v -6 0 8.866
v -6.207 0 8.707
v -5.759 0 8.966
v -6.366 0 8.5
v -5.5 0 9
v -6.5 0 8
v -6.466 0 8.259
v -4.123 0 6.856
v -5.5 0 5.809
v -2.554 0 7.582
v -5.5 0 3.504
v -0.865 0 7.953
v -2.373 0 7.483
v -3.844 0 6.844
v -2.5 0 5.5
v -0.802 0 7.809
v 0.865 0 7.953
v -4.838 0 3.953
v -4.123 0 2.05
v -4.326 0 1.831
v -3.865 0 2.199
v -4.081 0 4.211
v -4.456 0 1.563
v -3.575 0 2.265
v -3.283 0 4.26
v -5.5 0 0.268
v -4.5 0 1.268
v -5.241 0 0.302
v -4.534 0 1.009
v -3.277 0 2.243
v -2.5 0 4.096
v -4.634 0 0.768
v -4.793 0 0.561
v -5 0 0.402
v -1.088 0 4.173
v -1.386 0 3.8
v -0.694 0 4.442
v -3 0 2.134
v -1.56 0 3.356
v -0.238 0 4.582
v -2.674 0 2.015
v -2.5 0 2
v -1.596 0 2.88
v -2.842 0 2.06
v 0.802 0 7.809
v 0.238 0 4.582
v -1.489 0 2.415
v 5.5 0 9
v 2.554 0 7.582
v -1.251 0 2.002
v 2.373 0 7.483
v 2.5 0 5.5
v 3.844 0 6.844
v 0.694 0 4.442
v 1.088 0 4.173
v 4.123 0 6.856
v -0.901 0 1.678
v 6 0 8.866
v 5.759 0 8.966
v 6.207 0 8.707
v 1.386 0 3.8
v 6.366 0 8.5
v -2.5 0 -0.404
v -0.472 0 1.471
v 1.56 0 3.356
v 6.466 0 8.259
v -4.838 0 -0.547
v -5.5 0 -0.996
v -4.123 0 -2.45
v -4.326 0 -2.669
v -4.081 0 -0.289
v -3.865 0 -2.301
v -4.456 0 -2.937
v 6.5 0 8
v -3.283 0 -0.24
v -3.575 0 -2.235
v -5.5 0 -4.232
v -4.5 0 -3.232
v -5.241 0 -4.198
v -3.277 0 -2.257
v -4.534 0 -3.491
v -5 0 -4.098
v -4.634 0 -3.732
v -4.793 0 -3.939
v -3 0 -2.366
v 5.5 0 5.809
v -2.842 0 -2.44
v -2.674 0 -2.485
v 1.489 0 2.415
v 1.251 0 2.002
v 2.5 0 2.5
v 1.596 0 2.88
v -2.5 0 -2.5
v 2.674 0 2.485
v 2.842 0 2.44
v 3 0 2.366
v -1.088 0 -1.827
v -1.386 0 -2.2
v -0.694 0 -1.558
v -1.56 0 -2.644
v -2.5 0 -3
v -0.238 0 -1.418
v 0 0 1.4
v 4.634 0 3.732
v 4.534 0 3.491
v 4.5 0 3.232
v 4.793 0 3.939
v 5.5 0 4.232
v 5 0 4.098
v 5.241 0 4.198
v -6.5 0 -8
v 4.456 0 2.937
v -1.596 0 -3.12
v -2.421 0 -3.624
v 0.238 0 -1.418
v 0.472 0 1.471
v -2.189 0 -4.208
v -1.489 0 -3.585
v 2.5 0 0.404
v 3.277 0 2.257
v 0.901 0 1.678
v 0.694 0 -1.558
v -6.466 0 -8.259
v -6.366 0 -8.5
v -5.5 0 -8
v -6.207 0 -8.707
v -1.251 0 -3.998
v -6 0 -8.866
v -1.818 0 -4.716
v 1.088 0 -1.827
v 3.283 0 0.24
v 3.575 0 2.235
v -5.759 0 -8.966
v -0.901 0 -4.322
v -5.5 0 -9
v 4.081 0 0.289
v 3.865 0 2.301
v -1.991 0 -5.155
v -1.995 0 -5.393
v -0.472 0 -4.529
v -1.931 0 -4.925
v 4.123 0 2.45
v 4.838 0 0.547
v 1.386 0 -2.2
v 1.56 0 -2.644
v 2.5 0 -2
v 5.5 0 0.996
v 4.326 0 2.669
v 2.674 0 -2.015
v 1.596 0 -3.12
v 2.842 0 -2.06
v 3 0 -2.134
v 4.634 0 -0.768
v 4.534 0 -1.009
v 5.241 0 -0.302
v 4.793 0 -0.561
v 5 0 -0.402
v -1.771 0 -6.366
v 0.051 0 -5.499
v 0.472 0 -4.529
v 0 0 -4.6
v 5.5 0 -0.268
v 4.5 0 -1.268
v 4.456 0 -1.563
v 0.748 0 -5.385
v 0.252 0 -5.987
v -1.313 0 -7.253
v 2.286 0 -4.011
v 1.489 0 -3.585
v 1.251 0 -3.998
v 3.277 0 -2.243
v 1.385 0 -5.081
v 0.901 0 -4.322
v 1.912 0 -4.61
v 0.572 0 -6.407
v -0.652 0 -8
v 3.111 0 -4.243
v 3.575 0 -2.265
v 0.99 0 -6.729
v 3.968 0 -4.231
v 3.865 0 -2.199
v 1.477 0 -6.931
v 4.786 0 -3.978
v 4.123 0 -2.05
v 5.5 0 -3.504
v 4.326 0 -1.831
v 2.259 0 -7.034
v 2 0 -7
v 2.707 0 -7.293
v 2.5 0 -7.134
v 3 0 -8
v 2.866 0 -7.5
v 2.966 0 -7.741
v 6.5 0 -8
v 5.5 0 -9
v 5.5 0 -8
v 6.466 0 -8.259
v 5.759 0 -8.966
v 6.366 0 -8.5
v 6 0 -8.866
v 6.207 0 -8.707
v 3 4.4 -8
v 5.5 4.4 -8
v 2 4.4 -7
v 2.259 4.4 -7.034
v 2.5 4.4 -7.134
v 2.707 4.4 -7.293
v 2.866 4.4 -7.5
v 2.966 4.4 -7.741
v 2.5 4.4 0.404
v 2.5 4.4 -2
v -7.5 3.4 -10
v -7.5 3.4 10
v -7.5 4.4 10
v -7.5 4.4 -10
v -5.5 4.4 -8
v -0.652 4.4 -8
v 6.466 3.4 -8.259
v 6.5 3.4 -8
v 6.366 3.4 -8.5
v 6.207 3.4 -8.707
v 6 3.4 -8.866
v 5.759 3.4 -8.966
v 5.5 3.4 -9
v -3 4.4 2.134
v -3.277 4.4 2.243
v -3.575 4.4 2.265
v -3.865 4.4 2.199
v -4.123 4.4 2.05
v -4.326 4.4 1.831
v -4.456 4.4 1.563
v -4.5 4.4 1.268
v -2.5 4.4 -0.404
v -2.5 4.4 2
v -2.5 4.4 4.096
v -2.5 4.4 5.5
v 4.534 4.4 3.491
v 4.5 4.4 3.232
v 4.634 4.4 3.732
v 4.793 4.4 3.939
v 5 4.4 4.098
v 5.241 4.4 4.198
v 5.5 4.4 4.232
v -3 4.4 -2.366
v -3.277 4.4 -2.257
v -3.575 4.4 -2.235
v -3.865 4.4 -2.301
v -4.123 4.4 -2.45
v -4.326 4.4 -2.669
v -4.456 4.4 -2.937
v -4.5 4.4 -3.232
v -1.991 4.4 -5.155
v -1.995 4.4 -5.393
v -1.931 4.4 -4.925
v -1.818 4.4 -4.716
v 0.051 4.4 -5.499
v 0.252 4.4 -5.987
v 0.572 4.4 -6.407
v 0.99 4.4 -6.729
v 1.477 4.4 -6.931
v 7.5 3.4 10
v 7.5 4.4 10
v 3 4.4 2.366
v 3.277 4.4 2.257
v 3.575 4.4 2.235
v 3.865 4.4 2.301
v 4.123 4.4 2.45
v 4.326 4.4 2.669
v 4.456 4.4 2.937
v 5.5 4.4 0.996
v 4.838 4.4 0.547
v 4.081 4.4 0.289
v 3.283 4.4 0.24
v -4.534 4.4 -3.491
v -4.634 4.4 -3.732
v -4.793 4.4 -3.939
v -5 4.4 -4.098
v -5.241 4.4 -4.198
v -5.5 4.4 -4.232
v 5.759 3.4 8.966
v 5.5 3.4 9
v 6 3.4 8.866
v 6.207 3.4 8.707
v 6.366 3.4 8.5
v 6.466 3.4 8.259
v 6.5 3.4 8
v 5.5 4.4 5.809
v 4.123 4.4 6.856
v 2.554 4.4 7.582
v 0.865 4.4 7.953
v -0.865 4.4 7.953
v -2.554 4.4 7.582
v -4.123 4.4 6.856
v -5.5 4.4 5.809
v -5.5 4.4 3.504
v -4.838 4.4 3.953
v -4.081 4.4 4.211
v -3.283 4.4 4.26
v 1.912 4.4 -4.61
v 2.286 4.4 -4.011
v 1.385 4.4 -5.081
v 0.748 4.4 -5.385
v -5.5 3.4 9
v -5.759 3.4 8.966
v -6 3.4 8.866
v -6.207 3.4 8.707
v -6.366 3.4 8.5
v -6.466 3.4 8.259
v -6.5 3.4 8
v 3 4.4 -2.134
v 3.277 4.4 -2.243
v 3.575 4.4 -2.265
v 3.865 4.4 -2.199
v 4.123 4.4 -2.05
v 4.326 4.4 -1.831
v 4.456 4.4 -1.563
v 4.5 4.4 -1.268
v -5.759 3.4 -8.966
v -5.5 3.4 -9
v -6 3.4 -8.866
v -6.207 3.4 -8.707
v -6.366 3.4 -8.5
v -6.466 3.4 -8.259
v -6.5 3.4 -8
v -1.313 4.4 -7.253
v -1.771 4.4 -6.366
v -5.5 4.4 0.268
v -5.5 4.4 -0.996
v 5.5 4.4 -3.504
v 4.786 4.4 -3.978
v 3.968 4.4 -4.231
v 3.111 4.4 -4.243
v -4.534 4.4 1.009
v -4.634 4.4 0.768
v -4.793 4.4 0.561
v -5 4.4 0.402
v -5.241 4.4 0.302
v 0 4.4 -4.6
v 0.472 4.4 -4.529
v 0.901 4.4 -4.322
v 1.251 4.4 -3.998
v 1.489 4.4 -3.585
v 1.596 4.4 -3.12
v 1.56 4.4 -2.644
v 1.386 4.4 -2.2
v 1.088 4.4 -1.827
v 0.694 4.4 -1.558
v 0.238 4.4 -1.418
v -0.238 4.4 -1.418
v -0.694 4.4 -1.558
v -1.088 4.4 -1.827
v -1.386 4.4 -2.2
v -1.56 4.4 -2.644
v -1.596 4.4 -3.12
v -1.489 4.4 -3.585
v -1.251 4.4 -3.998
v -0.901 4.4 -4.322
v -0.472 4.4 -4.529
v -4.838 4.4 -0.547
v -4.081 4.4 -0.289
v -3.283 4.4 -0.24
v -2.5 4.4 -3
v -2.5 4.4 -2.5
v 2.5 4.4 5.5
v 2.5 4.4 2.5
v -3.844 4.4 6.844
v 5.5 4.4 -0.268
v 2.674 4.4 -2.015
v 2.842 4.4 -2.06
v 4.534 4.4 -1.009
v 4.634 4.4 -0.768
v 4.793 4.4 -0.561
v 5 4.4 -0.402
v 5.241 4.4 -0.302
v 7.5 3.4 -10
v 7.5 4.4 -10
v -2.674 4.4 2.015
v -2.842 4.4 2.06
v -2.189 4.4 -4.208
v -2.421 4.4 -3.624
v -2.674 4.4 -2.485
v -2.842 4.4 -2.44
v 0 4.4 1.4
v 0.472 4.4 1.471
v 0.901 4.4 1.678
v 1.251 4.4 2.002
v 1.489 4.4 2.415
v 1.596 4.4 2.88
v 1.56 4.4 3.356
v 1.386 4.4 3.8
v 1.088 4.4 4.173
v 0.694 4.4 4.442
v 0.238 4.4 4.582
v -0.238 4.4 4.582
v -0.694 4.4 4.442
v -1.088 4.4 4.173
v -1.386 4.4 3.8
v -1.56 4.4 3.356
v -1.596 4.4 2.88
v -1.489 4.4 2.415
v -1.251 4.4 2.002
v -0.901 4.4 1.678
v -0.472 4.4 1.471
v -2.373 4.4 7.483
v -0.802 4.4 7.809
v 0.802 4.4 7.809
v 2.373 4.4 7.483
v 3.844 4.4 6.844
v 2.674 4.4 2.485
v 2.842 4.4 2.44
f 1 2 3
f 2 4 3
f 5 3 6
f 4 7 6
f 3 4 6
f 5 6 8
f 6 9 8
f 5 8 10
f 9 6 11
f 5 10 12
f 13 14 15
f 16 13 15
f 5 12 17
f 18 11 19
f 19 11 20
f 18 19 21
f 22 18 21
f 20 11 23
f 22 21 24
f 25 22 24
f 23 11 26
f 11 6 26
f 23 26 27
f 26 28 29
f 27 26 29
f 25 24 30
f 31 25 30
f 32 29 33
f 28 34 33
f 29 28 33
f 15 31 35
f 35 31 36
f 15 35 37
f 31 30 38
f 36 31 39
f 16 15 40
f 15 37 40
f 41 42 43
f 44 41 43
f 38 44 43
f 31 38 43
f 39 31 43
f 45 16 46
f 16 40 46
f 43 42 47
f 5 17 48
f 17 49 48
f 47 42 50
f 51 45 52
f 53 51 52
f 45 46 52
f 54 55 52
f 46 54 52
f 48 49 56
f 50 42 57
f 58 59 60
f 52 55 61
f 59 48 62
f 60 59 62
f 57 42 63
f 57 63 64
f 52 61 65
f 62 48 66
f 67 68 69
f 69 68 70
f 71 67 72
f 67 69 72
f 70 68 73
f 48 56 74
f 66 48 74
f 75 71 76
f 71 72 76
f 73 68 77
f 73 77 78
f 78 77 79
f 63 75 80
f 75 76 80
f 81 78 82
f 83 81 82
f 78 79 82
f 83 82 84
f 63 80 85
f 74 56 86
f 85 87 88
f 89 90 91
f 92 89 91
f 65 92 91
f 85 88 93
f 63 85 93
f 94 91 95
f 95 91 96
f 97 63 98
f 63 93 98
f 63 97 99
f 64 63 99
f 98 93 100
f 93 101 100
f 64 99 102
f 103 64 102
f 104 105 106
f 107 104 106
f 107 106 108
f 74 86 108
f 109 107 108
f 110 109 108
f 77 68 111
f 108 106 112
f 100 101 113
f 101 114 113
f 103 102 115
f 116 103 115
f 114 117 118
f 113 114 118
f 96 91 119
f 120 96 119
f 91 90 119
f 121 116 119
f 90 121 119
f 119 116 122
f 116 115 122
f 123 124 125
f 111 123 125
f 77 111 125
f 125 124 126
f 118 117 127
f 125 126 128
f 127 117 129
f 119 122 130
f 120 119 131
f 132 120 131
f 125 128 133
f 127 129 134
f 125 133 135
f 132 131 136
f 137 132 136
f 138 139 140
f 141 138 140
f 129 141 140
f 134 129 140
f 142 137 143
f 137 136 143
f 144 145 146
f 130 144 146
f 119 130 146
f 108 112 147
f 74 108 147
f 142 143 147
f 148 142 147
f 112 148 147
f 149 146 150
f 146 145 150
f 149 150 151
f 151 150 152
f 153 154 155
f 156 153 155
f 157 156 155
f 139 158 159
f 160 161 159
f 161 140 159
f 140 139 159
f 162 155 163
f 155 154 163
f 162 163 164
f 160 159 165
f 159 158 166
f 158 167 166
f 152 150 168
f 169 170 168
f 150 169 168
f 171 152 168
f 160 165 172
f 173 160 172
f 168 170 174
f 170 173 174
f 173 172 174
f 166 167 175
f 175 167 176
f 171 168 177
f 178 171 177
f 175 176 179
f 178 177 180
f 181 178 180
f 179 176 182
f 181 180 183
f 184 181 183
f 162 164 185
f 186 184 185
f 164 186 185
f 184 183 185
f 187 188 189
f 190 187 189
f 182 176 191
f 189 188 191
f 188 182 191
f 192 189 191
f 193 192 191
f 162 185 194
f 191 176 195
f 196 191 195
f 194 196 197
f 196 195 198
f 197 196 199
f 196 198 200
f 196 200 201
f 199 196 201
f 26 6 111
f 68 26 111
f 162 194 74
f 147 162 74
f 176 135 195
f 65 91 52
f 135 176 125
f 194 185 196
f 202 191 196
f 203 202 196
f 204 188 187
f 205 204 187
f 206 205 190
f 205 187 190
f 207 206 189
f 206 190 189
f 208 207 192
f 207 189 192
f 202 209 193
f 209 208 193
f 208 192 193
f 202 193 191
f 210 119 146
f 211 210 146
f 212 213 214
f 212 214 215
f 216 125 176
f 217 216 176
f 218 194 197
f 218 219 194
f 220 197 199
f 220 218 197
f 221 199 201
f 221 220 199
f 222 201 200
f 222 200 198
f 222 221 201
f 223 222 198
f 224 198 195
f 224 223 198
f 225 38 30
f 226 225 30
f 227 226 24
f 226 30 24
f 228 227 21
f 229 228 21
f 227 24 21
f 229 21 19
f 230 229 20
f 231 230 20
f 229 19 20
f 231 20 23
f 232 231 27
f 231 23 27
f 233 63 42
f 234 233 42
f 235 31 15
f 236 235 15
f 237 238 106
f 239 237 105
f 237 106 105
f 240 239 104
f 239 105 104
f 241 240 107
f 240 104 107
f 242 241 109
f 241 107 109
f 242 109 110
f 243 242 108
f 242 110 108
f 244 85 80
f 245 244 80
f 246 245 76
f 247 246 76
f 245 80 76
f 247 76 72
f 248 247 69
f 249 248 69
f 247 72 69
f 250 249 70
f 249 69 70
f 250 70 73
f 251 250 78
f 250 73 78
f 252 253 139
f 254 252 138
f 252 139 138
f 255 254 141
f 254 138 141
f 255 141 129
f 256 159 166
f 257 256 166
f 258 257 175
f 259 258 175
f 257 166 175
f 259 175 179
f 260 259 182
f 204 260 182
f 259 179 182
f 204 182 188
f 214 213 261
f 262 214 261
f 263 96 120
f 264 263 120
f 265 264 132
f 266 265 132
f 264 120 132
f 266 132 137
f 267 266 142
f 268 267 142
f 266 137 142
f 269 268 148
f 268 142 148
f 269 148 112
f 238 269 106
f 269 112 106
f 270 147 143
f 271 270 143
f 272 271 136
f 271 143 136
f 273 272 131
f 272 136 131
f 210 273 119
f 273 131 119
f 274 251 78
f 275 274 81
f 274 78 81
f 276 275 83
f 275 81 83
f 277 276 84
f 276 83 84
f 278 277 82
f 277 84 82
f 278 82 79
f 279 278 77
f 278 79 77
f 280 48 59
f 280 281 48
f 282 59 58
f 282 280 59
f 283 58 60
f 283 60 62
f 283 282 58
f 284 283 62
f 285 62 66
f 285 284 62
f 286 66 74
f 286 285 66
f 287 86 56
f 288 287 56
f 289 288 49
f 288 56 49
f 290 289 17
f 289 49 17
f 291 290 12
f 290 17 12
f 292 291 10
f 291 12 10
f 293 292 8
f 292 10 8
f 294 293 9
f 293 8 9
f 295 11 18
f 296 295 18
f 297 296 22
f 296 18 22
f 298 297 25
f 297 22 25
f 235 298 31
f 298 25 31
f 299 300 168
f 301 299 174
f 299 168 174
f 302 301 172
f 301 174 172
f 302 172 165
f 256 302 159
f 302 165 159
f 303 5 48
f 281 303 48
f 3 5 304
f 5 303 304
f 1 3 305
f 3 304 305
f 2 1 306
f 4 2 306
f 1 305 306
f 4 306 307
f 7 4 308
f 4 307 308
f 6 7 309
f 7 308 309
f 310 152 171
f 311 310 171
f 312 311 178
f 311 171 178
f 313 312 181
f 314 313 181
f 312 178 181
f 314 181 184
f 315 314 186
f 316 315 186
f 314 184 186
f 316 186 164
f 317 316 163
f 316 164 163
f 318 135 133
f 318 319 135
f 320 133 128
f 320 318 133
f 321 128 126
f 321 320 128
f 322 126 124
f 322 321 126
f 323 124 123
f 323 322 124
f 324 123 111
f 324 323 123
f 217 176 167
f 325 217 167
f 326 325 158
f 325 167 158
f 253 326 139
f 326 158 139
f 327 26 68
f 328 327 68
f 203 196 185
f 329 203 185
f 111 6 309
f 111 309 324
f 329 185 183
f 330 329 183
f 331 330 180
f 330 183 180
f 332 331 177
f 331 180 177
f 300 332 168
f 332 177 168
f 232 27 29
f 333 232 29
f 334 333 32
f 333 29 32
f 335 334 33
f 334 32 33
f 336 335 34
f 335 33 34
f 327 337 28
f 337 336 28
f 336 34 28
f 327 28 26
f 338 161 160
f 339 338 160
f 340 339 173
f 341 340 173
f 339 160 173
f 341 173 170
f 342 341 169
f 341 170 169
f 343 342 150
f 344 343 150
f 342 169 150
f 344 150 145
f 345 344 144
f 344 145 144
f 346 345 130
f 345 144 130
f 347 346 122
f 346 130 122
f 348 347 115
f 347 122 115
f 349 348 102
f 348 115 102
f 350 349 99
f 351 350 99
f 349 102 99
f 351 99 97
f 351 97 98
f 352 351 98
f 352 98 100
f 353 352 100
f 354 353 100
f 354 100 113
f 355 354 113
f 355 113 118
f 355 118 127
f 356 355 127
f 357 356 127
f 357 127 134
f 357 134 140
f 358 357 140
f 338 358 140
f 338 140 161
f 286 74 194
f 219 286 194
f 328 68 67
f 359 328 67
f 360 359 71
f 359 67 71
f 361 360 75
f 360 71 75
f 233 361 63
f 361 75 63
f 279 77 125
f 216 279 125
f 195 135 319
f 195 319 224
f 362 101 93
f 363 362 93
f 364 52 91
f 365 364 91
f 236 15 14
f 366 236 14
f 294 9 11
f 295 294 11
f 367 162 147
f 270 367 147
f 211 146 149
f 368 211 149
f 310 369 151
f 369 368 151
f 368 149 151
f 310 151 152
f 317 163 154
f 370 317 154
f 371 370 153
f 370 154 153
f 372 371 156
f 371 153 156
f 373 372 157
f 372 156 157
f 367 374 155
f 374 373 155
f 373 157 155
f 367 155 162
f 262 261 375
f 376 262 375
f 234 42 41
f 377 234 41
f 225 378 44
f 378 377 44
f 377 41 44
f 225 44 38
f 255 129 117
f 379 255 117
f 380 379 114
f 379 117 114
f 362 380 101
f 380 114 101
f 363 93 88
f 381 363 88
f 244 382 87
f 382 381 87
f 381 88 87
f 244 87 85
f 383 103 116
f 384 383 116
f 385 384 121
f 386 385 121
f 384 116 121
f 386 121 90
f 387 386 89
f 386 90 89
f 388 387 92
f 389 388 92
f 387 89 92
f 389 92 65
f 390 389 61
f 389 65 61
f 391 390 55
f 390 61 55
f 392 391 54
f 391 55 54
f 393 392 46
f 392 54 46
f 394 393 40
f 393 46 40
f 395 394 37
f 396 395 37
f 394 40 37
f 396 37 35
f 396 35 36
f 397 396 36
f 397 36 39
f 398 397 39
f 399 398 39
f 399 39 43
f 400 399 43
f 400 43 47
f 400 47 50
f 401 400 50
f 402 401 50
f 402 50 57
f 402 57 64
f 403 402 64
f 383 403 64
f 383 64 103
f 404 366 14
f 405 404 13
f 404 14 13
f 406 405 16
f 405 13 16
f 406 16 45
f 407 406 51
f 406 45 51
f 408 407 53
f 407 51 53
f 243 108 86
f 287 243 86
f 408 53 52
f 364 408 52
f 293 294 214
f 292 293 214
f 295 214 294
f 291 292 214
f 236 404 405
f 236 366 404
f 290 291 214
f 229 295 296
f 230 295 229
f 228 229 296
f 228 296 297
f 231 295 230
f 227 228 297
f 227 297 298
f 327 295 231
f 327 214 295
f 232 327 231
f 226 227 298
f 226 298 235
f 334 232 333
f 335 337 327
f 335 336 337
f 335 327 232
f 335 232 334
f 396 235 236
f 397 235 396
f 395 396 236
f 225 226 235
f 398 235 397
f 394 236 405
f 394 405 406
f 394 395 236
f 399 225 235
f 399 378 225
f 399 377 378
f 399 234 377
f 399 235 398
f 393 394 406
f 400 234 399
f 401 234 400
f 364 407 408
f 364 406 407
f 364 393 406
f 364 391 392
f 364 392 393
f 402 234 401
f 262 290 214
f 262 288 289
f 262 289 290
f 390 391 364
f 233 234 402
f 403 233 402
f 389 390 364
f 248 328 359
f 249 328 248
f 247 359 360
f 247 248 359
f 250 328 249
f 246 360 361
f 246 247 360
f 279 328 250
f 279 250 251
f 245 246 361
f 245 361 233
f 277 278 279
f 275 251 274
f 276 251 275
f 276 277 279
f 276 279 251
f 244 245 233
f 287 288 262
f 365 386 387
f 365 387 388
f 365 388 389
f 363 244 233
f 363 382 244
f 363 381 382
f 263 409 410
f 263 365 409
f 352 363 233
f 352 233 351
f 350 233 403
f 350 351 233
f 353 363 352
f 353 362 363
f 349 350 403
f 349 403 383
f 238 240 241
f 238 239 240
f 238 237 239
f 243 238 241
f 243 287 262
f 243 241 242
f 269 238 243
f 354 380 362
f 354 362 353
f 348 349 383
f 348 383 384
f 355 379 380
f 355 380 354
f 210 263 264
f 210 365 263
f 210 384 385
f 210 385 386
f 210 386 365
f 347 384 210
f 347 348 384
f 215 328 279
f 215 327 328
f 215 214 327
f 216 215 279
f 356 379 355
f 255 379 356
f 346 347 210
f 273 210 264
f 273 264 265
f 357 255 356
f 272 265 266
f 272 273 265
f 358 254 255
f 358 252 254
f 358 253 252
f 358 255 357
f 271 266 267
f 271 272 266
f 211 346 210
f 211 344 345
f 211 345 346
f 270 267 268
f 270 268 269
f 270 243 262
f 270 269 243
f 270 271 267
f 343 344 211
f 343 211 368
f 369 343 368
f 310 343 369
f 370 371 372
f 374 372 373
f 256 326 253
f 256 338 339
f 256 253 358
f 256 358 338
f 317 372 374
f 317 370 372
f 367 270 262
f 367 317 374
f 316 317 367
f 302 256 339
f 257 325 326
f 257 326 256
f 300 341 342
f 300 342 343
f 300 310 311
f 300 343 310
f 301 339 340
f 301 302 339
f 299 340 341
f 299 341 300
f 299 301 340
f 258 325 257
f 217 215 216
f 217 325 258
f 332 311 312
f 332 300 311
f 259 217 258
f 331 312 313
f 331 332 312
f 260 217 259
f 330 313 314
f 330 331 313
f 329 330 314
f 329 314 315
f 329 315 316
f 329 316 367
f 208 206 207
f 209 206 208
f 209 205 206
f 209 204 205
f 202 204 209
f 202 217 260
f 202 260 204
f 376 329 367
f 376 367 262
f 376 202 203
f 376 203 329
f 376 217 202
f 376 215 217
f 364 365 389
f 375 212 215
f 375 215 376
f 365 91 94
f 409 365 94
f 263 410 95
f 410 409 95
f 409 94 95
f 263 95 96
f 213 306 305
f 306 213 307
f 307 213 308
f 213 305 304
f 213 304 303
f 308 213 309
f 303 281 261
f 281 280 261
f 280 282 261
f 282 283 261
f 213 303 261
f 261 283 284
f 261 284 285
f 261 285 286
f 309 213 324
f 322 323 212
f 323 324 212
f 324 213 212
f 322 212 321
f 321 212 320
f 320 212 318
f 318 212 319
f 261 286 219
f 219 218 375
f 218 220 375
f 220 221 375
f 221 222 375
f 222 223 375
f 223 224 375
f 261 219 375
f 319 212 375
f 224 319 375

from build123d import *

# Parameters (mm, degrees)
SKETCH1_W           = 13
SKETCH1_H           = 18
BOSS_EXTRUDE1_DEPTH = 3.4
SKETCH2_W           = 15
SKETCH2_H           = 20
BOSS_EXTRUDE2_DEPTH = 1
SKETCH4_R           = 1.6
CUT_EXTRUDE2_DEPTH  = 14.251792332
FILLET1_R           = 1


with BuildPart() as part:
    # Sketch1 → Boss-Extrude1 (new body)
    with BuildSketch(Plane(origin=(0, 0, 0), x_dir=(1, 0, 0), z_dir=(0, 1, 0))):
        Rectangle(SKETCH1_W, SKETCH1_H)
    extrude(amount=BOSS_EXTRUDE1_DEPTH)

    # Sketch2 → Boss-Extrude2 (add)
    with BuildSketch(Plane(origin=(0, 3.4, 0), x_dir=(1, 0, 0), z_dir=(0, 1, 0))):
        Rectangle(SKETCH2_W, SKETCH2_H)
    extrude(amount=BOSS_EXTRUDE2_DEPTH)

    # Sketch4 → Cut-Extrude2 (cut, through all)
    with BuildSketch(Plane.XZ):
        with BuildLine():
            Line((-2.5, 5.5), (-3.844272635, 6.844272635))
            ThreePointArc((-3.844272635, 6.844272635), (0, 7.85), (3.844272635, 6.844272635))
            Line((3.844272635, 6.844272635), (2.5, 5.5))
            Line((2.5, 5.5), (2.5, 2.5))
            ThreePointArc((2.5, 2.5), (2.758819045, 2.465925826), (3, 2.366025404))
            ThreePointArc((3, 2.366025404), (4, 2.366025404), (4.5, 3.232050808))
            ThreePointArc((4.5, 3.232050808), (4.792893219, 3.939157589), (5.5, 4.232050808))
            Line((5.5, 4.232050808), (5.5, 5.809475019))
            ThreePointArc((5.5, 5.809475019), (0, 8), (-5.5, 5.809475019))
            Line((-5.5, 5.809475019), (-5.5, 3.50401717))
            ThreePointArc((-5.5, 3.50401717), (-4.08113883, 4.211123951), (-2.5, 4.096376317))
            Line((-2.5, 4.096376317), (-2.5, 5.5))
        make_face()
        with BuildLine():
            Line((-2.5, -0.403623683), (-2.5, 2))
            ThreePointArc((-2.5, 2), (-2.758819045, 2.034074174), (-3, 2.133974596))
            ThreePointArc((-3, 2.133974596), (-4, 2.133974596), (-4.5, 1.267949192))
            ThreePointArc((-4.5, 1.267949192), (-4.792893219, 0.560842411), (-5.5, 0.267949192))
            Line((-5.5, 0.267949192), (-5.5, -0.99598283))
            ThreePointArc((-5.5, -0.99598283), (-4.08113883, -0.288876049), (-2.5, -0.403623683))
        make_face()
        with Locations(Location((0, 3, 0), (0, 0, 270))):
            Circle(SKETCH4_R)
        with BuildLine():
            ThreePointArc((5.5, 0.99598283), (4.08113883, 0.288876049), (2.5, 0.403623683))
            Line((2.5, 0.403623683), (2.5, -2))
            ThreePointArc((2.5, -2), (2.758819045, -2.034074174), (3, -2.133974596))
            ThreePointArc((3, -2.133974596), (4, -2.133974596), (4.5, -1.267949192))
            ThreePointArc((4.5, -1.267949192), (4.792893219, -0.560842411), (5.5, -0.267949192))
            Line((5.5, -0.267949192), (5.5, 0.99598283))
        make_face()
        with BuildLine():
            Line((-2.5, -3), (-2.5, -2.5))
            ThreePointArc((-2.5, -2.5), (-2.758819045, -2.465925826), (-3, -2.366025404))
            ThreePointArc((-3, -2.366025404), (-4, -2.366025404), (-4.5, -3.232050808))
            ThreePointArc((-4.5, -3.232050808), (-4.792893219, -3.939157589), (-5.5, -4.232050808))
            Line((-5.5, -4.232050808), (-5.5, -8))
            Line((-5.5, -8), (-0.651664446, -8))
            ThreePointArc((-0.651664446, -8), (-1.569721359, -6.823531152), (-1.994806392, -5.393073127))
            ThreePointArc((-1.994806392, -5.393073127), (-1.967548056, -5.03860077), (-1.817997773, -4.716066461))
            ThreePointArc((-1.817997773, -4.716066461), (-2.323251432, -3.923310773), (-2.5, -3))
        make_face()
        with BuildLine():
            ThreePointArc((5.5, -3.50401717), (3.967891244, -4.231237532), (2.286254496, -4.011454587))
            ThreePointArc((2.286254496, -4.011454587), (1.385482489, -5.080970512), (0.051275139, -5.499474117))
            ThreePointArc((0.051275139, -5.499474117), (0.77025343, -6.581403062), (2, -7))
            ThreePointArc((2, -7), (2.707106781, -7.292893219), (3, -8))
            Line((3, -8), (5.5, -8))
            Line((5.5, -8), (5.5, -3.50401717))
        make_face()
        with Locations(Location((0, -3, 0), (0, 0, 270))):
            Circle(SKETCH4_R)
    extrude(amount=-CUT_EXTRUDE2_DEPTH, mode=Mode.SUBTRACT)

    # Fillet1
    fillet1_edges = [part.edges().sort_by_distance(p)[0] for p in [
        (6.5, 1.7, 9),
        (-6.5, 1.7, 9),
        (-6.5, 1.7, -9),
        (6.5, 1.7, -9),
    ]]
    fillet(fillet1_edges, radius=FILLET1_R)


solid = part.part
